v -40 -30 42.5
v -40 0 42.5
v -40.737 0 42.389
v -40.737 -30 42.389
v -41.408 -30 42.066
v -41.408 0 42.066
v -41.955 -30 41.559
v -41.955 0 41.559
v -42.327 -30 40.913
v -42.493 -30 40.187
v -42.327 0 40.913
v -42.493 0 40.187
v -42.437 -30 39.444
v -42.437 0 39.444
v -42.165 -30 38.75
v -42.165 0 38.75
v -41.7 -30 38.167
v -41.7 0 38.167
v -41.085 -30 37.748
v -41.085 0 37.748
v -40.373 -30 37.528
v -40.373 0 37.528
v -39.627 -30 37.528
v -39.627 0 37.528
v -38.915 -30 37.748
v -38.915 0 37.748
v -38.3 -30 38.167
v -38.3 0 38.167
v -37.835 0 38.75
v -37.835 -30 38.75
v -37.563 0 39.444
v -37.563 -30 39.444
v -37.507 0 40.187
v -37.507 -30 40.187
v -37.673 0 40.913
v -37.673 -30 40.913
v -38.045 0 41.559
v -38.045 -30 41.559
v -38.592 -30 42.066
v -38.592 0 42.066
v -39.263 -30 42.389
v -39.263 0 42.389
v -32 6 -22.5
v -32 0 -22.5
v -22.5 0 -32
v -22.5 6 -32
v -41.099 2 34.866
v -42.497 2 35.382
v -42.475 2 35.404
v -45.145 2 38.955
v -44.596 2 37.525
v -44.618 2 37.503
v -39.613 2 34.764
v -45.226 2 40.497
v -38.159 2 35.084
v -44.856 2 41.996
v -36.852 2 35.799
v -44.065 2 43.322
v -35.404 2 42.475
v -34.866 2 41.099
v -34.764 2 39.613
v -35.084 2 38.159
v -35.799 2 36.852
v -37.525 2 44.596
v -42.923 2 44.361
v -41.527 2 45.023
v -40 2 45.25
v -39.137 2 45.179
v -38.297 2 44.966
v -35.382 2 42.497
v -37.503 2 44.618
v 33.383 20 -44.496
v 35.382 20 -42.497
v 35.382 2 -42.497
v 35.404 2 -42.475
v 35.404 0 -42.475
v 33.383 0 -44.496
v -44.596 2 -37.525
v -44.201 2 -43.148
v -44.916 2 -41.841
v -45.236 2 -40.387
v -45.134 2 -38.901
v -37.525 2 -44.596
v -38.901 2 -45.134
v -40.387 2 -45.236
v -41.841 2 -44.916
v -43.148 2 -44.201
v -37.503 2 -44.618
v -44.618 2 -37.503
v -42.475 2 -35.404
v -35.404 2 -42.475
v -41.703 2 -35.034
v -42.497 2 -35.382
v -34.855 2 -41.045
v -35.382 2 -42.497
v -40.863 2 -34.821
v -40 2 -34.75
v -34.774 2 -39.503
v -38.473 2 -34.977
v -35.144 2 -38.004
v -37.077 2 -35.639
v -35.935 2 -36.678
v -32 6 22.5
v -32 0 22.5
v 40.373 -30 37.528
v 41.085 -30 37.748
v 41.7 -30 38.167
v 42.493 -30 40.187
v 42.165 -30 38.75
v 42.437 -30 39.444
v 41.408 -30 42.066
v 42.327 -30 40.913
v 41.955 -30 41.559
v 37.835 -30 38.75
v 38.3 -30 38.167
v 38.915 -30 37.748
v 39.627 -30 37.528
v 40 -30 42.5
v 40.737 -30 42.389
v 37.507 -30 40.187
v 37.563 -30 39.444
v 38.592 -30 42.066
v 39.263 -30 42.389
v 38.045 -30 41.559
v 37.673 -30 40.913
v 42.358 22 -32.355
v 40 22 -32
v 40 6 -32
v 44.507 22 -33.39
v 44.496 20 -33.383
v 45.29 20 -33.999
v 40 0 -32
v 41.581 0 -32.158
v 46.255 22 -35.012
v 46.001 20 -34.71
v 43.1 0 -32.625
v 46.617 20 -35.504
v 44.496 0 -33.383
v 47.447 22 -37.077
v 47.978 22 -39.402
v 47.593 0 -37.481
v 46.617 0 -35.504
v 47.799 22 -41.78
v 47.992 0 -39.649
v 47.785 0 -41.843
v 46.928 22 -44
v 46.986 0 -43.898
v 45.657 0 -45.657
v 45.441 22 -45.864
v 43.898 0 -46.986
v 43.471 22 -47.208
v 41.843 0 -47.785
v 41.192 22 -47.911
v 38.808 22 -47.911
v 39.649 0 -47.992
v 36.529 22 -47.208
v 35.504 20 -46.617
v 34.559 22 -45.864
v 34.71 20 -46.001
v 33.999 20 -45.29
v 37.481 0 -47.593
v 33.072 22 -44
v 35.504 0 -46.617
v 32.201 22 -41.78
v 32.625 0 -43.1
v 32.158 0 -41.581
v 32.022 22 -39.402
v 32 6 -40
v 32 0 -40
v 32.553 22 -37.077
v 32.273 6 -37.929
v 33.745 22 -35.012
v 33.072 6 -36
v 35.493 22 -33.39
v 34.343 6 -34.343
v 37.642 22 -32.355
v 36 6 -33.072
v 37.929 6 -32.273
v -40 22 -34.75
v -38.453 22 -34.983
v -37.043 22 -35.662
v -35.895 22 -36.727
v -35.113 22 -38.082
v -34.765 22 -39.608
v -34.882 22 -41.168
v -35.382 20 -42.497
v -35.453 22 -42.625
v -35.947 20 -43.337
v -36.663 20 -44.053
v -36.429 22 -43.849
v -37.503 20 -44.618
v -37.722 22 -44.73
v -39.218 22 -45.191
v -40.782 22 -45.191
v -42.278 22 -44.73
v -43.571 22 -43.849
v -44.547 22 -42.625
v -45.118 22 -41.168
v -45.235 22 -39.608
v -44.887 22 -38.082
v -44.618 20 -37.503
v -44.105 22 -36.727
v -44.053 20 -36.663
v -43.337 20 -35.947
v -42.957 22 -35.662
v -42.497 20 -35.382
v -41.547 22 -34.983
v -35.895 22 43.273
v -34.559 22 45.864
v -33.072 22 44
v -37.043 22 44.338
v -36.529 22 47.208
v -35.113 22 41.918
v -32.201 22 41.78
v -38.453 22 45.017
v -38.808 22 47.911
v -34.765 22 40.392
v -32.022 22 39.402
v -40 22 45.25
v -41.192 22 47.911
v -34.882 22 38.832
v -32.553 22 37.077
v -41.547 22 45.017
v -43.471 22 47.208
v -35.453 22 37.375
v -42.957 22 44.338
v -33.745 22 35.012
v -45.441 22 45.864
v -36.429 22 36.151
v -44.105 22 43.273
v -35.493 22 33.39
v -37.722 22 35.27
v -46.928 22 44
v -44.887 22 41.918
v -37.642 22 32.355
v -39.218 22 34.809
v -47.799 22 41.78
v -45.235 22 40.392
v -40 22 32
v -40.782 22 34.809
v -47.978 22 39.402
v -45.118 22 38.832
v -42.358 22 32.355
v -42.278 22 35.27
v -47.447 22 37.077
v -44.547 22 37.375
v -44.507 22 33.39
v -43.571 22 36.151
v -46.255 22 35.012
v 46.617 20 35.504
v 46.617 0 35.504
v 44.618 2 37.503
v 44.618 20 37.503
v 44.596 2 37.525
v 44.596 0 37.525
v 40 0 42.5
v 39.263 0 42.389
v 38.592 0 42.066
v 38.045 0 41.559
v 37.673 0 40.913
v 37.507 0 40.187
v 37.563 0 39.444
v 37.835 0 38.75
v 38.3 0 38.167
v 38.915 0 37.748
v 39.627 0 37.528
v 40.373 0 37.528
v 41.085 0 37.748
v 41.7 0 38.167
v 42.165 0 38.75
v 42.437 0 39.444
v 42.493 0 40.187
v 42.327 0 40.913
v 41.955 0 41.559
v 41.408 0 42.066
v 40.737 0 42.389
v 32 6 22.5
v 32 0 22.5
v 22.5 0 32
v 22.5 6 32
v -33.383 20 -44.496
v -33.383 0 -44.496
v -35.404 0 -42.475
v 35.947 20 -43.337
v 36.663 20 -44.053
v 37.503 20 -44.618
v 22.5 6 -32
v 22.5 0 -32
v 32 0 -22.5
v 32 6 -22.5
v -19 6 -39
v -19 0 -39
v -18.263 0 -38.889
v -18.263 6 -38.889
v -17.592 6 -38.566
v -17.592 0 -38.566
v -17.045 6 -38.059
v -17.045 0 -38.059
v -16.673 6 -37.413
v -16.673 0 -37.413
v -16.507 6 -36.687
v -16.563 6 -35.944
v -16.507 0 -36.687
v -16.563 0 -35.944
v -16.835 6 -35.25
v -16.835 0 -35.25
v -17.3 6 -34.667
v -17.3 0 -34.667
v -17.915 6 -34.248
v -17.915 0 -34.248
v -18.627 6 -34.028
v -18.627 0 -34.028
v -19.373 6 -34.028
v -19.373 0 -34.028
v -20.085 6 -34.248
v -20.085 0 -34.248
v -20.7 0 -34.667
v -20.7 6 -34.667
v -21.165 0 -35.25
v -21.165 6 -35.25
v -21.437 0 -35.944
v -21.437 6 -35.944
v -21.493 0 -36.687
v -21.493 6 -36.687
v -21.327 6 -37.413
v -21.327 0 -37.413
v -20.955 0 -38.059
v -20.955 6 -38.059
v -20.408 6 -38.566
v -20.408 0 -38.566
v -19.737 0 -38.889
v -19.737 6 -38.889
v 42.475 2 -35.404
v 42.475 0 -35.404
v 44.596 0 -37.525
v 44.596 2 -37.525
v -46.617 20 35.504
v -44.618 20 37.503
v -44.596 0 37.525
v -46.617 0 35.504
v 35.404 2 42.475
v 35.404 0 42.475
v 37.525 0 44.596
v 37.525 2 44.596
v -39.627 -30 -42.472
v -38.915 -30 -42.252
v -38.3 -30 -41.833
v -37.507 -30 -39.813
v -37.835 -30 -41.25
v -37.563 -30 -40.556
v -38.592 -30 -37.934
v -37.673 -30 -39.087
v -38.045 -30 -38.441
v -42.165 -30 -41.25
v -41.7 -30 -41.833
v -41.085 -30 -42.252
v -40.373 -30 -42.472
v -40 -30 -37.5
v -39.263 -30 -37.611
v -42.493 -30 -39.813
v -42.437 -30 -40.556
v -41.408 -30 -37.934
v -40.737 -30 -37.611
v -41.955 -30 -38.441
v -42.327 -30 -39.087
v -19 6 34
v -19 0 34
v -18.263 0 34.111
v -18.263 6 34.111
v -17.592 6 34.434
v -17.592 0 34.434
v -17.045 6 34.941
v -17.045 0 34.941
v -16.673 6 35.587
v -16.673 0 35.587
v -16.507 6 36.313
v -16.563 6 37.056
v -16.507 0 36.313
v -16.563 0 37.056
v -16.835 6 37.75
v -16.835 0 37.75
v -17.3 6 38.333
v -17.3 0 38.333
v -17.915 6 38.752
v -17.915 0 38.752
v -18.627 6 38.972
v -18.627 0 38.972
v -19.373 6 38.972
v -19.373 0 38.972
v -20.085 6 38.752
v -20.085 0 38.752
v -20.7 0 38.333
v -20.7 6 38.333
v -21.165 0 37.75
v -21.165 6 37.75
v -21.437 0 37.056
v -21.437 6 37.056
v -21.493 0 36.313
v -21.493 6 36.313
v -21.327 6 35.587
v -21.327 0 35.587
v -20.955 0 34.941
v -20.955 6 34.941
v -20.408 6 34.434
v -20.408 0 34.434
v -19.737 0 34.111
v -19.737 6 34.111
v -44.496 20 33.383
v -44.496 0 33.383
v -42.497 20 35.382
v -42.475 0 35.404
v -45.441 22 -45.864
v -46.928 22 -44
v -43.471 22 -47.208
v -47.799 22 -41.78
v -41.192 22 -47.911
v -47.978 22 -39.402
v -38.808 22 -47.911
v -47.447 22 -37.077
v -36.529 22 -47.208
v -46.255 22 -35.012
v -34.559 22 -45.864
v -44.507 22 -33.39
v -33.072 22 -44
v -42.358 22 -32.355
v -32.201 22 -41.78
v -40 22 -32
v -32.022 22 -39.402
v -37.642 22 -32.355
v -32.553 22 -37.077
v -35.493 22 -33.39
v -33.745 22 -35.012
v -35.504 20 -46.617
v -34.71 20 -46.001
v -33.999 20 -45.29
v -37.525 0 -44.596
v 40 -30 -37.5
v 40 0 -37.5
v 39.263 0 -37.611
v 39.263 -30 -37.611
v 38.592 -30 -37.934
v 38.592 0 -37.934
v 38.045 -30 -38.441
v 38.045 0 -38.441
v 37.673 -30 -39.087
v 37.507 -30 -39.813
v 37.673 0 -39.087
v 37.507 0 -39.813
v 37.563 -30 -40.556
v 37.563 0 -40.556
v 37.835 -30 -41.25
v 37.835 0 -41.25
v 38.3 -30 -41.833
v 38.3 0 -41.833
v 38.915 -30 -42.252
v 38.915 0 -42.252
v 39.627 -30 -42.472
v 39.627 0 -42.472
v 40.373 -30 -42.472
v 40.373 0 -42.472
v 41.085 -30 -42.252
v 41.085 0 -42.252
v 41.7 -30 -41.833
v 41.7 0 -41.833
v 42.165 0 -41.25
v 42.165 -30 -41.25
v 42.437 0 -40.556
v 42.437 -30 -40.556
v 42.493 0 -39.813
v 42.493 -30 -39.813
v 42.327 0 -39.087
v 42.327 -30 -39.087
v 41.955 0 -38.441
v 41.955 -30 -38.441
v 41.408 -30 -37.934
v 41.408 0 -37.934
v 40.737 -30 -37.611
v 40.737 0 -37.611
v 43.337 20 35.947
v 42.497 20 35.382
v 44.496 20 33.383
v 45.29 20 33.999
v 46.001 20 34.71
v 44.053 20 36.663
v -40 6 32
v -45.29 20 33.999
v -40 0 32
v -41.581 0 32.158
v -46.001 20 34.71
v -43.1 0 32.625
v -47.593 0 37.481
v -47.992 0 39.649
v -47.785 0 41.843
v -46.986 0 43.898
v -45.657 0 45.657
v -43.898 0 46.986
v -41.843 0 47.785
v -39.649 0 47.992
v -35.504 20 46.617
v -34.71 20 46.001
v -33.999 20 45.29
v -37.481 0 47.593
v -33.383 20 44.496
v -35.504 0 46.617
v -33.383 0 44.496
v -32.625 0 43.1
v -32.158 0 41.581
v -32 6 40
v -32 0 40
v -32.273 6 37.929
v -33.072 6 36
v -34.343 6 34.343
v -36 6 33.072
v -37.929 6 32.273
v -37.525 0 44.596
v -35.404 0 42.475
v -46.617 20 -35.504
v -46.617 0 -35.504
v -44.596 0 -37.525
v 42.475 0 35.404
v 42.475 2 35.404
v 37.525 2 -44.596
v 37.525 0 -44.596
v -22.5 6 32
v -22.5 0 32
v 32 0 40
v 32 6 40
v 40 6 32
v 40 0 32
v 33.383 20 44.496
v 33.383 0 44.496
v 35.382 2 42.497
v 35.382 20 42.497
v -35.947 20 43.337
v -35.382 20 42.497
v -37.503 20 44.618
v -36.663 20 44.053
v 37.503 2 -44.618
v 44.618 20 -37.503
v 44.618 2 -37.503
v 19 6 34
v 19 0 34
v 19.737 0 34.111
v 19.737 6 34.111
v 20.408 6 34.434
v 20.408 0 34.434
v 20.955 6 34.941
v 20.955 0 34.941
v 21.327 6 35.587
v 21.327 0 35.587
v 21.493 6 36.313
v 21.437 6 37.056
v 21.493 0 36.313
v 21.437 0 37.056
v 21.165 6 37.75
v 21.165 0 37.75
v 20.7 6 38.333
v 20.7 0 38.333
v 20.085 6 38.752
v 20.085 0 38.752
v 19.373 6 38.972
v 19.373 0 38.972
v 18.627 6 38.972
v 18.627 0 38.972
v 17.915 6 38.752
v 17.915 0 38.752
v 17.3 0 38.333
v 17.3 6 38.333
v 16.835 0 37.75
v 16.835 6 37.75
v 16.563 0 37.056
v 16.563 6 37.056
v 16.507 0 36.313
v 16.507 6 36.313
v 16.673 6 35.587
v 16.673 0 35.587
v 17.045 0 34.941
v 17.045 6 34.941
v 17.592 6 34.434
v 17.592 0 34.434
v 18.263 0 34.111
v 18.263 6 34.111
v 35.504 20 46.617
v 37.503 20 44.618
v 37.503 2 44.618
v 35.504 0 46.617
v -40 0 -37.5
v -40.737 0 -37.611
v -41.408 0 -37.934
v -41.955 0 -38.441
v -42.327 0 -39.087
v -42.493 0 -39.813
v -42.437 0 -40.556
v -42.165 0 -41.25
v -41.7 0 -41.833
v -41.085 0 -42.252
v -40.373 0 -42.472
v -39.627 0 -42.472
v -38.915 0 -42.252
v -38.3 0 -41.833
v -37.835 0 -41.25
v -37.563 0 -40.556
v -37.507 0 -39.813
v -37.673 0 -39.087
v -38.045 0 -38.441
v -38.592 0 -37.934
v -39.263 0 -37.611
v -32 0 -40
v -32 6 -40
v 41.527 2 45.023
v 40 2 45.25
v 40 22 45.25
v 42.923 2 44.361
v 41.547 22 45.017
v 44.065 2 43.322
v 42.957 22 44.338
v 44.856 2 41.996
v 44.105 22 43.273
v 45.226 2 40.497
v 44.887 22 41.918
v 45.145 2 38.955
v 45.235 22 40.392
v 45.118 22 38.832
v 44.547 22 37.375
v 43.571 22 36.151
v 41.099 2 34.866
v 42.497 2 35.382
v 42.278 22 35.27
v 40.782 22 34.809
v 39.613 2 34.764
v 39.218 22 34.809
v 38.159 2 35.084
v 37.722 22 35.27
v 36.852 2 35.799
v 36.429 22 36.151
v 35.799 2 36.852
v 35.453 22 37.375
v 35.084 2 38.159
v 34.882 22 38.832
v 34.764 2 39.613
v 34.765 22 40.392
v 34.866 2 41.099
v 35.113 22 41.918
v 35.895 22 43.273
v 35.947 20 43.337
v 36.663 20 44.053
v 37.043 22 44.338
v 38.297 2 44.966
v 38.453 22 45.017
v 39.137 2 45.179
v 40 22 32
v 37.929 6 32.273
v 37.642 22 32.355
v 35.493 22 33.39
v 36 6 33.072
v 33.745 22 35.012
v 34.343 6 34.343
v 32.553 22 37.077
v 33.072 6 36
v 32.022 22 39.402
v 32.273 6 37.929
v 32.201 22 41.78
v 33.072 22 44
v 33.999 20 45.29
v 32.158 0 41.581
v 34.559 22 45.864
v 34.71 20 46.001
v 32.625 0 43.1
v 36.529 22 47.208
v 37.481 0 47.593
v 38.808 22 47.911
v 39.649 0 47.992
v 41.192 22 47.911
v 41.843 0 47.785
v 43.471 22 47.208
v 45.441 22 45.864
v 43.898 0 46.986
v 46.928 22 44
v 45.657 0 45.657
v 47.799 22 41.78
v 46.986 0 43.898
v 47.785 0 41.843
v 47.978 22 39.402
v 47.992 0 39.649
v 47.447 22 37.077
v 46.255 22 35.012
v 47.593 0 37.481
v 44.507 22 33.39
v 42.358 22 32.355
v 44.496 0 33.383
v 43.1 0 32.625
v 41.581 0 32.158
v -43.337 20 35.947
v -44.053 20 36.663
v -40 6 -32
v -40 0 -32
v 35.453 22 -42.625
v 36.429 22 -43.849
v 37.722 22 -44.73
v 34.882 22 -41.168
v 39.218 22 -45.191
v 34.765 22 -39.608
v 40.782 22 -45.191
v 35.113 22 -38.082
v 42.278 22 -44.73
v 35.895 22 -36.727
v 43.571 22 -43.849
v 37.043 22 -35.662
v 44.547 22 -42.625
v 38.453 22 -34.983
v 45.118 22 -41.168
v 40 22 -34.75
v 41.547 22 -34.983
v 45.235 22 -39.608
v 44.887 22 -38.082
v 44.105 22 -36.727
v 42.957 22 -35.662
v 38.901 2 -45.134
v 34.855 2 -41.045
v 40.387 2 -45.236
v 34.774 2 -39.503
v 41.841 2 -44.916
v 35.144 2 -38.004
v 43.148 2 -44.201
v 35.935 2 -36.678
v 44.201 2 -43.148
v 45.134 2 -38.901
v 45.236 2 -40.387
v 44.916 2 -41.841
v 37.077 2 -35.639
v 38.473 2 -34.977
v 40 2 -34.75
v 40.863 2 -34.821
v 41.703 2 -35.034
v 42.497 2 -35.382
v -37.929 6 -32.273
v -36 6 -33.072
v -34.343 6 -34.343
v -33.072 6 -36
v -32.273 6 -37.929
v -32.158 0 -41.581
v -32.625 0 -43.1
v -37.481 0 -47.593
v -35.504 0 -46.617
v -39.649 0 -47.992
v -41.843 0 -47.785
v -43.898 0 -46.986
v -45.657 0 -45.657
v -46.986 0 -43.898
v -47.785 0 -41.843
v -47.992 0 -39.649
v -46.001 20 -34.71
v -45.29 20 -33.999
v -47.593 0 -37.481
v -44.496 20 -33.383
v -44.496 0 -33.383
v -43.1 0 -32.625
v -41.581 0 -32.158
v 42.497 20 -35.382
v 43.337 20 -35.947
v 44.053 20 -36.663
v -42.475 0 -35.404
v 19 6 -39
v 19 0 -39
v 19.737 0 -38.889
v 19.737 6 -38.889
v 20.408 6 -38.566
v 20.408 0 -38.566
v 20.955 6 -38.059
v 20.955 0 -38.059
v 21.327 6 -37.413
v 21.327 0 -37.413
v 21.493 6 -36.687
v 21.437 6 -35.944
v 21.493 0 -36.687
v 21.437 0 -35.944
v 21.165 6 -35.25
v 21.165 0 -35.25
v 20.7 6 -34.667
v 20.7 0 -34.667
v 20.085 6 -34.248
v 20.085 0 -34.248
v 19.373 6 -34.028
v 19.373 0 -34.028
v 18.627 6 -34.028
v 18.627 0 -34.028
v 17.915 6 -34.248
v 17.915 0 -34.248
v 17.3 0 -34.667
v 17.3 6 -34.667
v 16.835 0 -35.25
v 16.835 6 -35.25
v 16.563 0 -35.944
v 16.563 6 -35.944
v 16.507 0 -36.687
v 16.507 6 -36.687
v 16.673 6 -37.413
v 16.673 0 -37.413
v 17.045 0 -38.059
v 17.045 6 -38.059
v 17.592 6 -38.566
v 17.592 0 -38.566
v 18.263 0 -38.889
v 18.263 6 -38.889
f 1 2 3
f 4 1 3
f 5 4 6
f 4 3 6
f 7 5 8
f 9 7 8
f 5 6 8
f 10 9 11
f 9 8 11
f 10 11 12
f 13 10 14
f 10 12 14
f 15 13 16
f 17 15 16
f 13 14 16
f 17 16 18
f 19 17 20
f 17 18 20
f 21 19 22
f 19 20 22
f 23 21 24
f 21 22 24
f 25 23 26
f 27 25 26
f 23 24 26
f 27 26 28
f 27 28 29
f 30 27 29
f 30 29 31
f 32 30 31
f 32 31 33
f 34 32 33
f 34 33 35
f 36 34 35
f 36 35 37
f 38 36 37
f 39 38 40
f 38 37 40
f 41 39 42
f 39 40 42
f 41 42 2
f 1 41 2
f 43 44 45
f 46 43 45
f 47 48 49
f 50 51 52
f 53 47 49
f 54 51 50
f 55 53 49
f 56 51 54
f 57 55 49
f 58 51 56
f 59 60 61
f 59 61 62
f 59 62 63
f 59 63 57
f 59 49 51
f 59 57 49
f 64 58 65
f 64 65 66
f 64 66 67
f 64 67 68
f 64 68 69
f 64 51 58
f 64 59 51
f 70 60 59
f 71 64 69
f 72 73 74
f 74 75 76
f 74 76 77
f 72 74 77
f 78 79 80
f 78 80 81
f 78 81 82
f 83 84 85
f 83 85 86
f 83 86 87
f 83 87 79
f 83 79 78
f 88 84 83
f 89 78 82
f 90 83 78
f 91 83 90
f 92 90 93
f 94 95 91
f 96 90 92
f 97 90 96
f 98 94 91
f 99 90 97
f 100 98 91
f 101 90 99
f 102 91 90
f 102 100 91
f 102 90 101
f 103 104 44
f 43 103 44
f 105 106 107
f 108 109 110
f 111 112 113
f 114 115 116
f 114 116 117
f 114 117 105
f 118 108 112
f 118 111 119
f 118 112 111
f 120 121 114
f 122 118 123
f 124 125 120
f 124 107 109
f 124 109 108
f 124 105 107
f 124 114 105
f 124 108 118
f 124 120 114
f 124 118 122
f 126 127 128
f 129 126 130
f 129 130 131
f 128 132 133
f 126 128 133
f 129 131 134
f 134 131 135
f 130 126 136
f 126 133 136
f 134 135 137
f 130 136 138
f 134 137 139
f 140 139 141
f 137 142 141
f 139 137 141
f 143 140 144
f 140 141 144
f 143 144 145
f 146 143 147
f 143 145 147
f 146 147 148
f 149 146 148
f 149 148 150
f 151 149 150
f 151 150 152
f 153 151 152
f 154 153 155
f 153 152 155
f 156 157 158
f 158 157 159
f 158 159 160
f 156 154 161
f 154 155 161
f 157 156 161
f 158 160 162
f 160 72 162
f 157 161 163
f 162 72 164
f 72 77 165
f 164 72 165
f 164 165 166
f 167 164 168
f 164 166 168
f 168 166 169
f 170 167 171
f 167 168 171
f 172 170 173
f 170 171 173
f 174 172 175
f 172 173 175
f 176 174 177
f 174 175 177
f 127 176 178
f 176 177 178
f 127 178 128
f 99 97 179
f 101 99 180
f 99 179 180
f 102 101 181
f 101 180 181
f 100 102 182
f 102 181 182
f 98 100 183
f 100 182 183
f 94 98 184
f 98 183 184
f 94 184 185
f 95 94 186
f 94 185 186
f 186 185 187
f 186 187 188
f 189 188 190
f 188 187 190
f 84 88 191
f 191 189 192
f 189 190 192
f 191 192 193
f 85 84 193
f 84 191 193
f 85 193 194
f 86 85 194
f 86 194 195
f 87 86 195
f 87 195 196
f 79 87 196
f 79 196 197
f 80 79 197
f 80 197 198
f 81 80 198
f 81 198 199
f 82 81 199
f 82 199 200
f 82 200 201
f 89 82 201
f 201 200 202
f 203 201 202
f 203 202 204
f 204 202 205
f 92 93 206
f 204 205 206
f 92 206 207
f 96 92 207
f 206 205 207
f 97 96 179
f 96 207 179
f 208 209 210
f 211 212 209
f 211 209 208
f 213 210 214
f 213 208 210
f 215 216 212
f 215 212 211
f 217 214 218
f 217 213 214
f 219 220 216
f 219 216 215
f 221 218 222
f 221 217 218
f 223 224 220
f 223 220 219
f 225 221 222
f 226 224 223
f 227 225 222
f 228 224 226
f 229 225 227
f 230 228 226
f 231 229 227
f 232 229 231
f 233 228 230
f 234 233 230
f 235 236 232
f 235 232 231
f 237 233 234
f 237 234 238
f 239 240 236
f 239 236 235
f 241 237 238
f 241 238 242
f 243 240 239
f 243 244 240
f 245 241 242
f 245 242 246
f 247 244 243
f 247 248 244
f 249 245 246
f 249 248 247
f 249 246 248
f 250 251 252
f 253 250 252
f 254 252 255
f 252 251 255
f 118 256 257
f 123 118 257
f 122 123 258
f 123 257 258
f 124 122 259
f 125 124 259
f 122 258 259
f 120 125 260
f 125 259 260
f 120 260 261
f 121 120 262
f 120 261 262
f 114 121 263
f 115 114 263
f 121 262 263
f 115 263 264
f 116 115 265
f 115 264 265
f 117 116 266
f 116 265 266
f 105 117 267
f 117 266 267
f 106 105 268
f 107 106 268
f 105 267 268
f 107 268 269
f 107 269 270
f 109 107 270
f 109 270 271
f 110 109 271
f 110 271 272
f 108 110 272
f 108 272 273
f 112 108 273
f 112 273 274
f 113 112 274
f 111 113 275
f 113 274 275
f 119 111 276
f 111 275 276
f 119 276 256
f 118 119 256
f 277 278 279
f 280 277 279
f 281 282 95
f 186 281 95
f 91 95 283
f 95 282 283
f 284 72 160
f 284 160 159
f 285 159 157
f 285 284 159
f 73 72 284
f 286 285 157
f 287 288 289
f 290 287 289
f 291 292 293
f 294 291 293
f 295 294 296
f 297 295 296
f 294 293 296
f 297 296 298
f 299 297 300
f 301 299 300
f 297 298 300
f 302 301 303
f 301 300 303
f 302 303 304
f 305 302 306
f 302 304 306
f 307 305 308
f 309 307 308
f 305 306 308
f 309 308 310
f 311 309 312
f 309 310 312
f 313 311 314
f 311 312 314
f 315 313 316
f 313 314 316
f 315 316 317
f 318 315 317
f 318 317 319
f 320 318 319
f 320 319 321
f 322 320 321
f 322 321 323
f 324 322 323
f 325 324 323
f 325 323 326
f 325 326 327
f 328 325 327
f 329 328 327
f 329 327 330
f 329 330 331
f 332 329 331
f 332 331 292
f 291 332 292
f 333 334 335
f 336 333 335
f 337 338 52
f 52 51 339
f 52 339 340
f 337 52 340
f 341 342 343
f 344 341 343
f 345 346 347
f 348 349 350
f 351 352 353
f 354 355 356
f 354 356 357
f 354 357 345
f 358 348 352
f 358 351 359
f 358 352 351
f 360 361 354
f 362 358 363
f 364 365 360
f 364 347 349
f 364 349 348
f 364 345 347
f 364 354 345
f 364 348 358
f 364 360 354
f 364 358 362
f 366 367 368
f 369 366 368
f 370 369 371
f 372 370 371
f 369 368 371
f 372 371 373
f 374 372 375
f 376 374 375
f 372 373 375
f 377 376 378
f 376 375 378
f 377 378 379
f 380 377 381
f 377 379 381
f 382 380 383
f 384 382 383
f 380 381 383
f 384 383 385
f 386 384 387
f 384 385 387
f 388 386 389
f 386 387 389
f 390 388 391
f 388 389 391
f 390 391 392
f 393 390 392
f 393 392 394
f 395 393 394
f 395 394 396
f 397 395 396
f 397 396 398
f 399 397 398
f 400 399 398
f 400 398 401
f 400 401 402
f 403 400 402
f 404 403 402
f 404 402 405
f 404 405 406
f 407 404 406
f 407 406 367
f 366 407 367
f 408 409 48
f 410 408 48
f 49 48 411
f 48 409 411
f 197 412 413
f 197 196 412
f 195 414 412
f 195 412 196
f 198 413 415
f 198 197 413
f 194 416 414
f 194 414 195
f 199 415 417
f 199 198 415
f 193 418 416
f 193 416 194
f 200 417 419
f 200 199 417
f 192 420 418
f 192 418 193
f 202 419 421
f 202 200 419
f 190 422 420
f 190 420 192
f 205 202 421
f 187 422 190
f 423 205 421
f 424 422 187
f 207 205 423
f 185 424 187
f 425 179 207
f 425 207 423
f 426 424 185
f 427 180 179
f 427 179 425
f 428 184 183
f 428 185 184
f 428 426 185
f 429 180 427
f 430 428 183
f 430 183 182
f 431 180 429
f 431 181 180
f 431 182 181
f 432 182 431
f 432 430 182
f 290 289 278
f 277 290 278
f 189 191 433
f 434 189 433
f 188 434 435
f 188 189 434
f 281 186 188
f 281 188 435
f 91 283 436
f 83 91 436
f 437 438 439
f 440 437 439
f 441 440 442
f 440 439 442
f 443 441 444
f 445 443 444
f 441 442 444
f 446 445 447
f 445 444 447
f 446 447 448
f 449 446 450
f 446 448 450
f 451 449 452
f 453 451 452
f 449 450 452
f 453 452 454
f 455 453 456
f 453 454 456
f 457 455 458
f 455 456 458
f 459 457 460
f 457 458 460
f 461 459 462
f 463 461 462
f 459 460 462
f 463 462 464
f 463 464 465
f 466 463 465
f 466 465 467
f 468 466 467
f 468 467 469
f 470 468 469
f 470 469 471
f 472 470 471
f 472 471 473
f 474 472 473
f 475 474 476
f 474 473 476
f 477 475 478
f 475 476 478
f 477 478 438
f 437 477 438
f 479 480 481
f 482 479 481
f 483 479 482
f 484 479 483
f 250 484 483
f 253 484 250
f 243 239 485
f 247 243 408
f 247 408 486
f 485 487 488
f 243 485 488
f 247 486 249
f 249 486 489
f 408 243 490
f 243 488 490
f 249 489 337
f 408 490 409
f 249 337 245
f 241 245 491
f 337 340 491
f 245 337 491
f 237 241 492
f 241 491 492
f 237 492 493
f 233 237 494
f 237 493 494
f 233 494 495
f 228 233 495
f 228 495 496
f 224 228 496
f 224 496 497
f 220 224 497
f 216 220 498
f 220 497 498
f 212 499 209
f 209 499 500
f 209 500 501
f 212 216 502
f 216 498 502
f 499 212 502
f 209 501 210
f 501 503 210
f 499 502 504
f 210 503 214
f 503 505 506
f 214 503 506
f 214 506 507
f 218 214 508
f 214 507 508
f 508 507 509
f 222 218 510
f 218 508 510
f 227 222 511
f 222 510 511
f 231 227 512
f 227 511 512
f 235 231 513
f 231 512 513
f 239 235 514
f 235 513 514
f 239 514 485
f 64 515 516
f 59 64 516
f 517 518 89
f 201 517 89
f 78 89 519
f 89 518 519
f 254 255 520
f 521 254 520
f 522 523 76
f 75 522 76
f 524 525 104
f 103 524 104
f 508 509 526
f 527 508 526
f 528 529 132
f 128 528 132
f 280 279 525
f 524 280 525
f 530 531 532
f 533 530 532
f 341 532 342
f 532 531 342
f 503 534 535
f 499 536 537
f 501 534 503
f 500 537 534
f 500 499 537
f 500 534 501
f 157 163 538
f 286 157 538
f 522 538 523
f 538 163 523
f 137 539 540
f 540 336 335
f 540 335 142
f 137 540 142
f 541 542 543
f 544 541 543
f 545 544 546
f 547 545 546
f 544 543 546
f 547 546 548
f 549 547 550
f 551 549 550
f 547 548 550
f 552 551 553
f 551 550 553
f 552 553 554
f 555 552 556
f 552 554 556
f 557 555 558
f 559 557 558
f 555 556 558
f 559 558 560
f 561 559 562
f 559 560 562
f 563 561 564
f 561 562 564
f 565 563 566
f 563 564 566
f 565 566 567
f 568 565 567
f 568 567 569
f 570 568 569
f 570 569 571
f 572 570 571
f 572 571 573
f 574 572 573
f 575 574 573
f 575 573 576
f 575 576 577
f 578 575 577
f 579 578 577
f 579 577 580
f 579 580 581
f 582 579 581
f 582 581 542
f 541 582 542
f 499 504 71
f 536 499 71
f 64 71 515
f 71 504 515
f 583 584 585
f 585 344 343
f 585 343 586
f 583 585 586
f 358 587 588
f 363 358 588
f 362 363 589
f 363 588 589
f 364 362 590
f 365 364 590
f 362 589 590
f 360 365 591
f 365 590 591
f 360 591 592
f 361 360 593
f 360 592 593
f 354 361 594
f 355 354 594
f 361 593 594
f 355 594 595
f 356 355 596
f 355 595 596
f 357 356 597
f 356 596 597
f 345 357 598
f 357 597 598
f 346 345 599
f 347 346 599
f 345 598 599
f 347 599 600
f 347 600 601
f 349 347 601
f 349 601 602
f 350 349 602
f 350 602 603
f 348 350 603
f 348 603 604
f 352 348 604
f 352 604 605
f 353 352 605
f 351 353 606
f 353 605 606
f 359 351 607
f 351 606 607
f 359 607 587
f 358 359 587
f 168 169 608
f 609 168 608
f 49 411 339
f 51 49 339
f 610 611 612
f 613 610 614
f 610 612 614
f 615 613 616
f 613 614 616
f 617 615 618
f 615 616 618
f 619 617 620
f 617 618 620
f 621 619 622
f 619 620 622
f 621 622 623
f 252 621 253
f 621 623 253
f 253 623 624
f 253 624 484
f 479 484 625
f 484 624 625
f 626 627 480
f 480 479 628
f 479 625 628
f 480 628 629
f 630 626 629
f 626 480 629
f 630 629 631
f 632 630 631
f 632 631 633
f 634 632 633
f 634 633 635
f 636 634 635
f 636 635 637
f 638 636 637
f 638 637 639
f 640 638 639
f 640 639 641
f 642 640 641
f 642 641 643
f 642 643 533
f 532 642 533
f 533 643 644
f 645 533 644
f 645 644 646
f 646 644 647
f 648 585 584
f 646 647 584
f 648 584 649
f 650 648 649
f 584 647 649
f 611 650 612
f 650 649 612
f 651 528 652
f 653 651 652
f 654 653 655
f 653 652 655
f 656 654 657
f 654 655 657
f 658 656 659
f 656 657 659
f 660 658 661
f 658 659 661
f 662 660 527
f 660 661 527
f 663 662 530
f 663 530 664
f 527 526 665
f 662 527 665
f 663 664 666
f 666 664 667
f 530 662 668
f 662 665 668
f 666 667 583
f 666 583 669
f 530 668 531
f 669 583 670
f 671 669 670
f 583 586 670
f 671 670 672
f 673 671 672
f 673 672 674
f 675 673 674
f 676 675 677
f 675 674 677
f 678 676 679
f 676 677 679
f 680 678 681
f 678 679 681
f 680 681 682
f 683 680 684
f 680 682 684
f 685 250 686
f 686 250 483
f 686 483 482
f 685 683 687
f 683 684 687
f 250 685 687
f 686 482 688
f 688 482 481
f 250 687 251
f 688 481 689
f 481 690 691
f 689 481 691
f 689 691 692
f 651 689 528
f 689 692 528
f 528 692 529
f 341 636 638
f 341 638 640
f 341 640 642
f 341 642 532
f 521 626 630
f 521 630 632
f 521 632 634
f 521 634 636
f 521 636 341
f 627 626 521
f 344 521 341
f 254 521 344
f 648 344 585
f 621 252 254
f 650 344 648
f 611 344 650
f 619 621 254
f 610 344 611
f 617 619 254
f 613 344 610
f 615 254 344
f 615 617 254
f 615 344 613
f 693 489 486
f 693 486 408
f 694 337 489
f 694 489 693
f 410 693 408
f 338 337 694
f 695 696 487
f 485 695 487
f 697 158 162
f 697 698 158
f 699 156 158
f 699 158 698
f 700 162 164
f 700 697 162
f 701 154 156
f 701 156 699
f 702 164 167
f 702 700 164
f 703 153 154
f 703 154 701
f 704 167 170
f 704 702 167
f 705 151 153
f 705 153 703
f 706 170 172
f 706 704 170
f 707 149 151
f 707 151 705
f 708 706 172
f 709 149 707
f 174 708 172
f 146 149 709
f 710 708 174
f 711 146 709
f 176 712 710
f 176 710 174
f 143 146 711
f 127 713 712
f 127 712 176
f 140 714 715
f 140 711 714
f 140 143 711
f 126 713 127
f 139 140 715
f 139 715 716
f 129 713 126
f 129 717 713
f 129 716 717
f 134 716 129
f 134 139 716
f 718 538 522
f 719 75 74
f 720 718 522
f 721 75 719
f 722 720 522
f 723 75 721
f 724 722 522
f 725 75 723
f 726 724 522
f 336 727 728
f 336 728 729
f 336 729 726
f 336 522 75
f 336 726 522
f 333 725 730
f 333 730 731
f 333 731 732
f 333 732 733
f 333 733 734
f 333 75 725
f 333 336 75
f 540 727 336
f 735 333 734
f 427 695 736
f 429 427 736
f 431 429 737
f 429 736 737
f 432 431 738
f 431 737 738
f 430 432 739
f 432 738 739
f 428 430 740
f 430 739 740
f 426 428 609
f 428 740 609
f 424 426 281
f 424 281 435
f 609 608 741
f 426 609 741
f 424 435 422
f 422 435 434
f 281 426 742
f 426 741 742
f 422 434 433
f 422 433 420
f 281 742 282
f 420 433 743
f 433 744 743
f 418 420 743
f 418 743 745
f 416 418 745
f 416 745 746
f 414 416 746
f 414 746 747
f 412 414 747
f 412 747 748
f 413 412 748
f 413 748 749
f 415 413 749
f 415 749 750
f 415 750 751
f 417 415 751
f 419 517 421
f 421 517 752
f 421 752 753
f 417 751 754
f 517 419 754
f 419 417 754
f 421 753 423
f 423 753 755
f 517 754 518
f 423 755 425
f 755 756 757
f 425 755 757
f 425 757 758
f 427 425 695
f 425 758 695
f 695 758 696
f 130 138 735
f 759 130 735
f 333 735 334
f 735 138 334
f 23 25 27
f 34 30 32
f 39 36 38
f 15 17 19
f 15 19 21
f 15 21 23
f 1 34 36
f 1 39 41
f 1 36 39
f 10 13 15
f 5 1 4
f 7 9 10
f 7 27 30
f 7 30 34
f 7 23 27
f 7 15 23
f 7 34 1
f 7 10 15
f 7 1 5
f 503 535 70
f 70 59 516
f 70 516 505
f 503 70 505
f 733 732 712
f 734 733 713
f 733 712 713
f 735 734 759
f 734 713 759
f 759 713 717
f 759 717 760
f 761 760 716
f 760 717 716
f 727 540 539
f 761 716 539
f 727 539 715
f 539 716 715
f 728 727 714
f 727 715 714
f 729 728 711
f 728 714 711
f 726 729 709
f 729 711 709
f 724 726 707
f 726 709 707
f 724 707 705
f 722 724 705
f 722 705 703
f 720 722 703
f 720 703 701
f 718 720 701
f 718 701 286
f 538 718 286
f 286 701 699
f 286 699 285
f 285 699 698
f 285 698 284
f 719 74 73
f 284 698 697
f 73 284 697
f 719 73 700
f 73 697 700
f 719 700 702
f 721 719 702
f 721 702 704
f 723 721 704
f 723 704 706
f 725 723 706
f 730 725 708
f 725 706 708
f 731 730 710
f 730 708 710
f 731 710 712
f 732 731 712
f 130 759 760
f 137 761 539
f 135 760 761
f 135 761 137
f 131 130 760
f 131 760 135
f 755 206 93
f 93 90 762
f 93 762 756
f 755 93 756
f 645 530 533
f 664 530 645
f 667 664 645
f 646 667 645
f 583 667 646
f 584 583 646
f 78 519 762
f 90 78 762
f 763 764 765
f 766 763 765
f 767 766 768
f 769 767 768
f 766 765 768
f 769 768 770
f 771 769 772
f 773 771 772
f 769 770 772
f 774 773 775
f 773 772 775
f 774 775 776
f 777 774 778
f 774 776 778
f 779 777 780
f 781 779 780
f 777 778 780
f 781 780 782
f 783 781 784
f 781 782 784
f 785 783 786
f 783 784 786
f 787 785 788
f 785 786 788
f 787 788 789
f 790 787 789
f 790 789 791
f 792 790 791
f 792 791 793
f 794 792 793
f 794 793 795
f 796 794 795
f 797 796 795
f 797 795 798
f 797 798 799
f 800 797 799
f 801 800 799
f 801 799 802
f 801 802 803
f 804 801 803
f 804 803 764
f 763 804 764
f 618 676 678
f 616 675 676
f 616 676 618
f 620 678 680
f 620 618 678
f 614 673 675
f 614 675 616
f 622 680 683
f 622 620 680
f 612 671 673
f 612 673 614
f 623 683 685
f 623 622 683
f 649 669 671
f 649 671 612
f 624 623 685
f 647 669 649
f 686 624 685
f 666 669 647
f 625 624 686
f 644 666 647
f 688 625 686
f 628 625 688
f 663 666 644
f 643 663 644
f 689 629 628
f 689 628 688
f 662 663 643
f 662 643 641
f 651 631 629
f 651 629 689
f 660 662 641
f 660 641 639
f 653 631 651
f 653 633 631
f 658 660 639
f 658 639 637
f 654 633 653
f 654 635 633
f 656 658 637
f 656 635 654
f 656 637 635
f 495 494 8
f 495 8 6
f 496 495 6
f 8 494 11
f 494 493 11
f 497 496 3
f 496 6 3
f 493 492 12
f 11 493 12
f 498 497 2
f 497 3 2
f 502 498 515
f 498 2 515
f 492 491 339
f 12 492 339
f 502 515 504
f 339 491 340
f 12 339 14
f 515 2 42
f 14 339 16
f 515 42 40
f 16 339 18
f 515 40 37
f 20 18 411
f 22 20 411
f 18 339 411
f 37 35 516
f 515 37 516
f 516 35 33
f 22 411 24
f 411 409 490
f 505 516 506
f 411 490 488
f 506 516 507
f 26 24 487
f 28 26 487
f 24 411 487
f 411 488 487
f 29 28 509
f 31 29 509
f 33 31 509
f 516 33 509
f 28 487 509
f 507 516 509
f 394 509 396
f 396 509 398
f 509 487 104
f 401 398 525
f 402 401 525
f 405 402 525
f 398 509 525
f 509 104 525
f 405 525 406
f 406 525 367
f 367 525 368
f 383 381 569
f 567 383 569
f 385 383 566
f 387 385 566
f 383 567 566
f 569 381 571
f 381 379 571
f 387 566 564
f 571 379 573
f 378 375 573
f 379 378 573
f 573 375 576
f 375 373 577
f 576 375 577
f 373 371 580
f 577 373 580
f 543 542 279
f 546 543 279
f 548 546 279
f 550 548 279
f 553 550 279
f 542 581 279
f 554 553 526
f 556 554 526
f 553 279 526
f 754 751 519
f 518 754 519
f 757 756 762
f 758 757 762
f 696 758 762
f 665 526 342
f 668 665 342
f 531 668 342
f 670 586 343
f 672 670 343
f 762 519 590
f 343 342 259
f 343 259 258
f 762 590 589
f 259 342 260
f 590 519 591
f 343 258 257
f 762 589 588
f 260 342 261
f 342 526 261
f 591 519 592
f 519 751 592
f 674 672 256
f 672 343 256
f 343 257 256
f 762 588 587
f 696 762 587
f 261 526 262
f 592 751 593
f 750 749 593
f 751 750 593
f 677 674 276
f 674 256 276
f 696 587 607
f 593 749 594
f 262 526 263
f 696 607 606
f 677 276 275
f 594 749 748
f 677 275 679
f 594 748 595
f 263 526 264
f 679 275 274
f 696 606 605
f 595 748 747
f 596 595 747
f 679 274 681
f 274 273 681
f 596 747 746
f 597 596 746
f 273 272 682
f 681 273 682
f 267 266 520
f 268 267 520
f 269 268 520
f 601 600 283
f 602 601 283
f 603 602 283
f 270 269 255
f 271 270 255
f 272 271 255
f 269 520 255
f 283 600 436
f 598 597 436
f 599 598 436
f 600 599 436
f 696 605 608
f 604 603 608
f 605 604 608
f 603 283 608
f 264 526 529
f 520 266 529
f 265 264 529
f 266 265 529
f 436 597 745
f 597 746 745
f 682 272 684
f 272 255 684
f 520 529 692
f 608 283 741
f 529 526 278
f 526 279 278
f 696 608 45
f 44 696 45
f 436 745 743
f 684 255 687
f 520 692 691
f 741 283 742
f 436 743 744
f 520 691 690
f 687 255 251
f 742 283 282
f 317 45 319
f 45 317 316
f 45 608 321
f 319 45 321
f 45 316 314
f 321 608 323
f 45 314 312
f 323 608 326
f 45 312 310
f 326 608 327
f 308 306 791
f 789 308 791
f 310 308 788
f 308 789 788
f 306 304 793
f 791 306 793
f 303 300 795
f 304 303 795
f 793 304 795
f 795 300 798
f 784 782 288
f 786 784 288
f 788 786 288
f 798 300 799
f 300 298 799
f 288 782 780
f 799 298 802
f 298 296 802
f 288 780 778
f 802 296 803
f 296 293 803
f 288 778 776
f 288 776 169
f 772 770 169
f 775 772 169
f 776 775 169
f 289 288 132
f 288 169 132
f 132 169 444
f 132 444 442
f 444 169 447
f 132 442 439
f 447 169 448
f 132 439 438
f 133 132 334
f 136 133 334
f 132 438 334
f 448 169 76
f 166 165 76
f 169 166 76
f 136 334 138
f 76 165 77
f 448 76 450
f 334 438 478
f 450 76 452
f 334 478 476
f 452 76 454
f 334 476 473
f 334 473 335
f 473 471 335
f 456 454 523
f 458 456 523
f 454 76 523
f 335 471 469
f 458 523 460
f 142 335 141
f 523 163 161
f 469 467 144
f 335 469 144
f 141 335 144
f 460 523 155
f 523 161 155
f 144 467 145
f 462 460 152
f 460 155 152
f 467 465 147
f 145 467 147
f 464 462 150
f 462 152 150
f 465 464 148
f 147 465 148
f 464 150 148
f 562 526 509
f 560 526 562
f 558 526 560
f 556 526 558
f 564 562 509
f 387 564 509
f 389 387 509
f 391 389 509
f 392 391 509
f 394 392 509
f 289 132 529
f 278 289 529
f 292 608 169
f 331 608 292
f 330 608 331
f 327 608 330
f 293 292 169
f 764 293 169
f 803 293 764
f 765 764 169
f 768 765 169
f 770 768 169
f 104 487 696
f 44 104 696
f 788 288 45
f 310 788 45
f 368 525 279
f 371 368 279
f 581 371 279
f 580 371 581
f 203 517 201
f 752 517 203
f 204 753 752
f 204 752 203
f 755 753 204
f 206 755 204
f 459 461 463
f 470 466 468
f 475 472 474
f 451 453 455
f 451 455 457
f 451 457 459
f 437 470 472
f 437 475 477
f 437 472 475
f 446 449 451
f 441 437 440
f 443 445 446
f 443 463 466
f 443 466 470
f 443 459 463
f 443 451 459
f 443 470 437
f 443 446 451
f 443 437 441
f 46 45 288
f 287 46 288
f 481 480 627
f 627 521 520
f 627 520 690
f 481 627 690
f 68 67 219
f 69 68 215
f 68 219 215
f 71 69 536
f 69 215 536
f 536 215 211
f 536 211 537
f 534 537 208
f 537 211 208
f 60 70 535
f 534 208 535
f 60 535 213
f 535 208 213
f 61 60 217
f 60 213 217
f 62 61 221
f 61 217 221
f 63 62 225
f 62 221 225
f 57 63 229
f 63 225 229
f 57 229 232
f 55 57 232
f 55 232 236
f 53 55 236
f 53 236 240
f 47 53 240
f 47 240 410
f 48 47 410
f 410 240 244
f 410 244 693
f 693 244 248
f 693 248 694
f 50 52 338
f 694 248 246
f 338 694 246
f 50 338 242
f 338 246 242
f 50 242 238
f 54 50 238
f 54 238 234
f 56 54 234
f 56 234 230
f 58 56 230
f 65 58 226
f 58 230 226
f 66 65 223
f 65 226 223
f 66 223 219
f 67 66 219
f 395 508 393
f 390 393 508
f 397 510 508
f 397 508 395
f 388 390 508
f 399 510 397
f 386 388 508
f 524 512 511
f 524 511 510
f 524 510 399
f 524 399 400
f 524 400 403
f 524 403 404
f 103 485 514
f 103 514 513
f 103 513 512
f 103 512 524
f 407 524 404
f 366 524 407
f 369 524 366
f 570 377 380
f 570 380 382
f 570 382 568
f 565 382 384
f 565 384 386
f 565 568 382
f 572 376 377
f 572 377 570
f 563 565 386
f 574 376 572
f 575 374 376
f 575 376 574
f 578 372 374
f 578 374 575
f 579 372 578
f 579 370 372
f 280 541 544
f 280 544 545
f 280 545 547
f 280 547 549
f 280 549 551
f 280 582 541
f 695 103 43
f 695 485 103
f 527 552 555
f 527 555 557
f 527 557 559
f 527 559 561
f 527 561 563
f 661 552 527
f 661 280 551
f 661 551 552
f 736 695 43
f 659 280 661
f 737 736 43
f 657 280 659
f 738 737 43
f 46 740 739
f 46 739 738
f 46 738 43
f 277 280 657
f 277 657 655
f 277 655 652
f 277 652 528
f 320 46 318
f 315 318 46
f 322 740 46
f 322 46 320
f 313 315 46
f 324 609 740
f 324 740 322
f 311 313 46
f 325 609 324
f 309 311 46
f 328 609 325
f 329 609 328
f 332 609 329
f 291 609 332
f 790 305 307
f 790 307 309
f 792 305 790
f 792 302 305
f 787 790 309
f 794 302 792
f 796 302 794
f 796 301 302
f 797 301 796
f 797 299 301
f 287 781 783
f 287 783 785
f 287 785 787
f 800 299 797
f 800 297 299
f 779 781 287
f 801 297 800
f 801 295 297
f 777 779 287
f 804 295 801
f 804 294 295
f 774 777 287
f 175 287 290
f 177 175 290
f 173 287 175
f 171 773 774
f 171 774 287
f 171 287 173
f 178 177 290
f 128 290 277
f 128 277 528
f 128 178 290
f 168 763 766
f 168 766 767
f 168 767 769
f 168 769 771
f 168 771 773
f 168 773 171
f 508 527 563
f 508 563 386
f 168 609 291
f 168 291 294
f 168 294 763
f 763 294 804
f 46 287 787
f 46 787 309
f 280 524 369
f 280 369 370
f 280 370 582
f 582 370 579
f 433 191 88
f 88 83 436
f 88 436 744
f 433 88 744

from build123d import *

# Parameters (mm, degrees)
BOSS_EXTRUDE1_DEPTH      = 6
SKETCH2_R                = 2.5
CUT_EXTRUDE1_DEPTH       = 69.14690015
BOSS_EXTRUDE2_DEPTH      = 16
BOSS_EXTRUDE2_DEPTH_BACK = 4
SKETCH4_R                = 8
CUT_EXTRUDE2_DEPTH       = 20
SKETCH7_R                = 5.25
CUT_EXTRUDE3_DEPTH       = 20
SKETCH8_R                = 2.5
BOSS_EXTRUDE3_DEPTH      = 30


with BuildPart() as part:
    # Sketch1 → Boss-Extrude1 (new body)
    with BuildSketch(Plane(origin=(0, 0, 0), x_dir=(1, 0, 0), z_dir=(0, 1, 0))):
        with BuildLine():
            Line((-32, -40), (32, -40))
            ThreePointArc((32, -40), (45.656854249, -45.656854249), (40, -32))
            Line((40, -32), (40, 32))
            ThreePointArc((40, 32), (45.656854249, 45.656854249), (32, 40))
            Line((32, 40), (-32, 40))
            ThreePointArc((-32, 40), (-45.656854249, 45.656854249), (-40, 32))
            Line((-40, 32), (-40, -32))
            ThreePointArc((-40, -32), (-45.656854249, -45.656854249), (-32, -40))
        make_face()
        Polygon((-22.5, 32), (22.5, 32), (32, 22.5), (32, -22.5), (22.5, -32), (-22.5, -32), (-32, -22.5), (-32, 22.5), align=None, mode=Mode.SUBTRACT)
    extrude(amount=BOSS_EXTRUDE1_DEPTH)

    # Sketch2 → Cut-Extrude1 (cut, through all)
    with BuildSketch(Plane.XZ):
        with Locations(Location((-19, -36.5, 0), (0, 0, 270))):
            Circle(SKETCH2_R)
        with Locations(Location((19, -36.5, 0), (0, 0, 270))):
            Circle(SKETCH2_R)
        with Locations(Location((19, 36.5, 0), (0, 0, 270))):
            Circle(SKETCH2_R)
        with Locations(Location((-19, 36.5, 0), (0, 0, 270))):
            Circle(SKETCH2_R)
    extrude(amount=-CUT_EXTRUDE1_DEPTH, mode=Mode.SUBTRACT)

    # Sketch4 → Boss-Extrude2 (add, two sides: drawn at the far end of the back side and taken through both)
    with BuildSketch(Plane(origin=(0, 6, 0), x_dir=(1, 0, 0), z_dir=(0, 1, 0)).offset(-BOSS_EXTRUDE2_DEPTH_BACK)):
        with Locations(Location((-40, 40, 0), (0, 0, 270))):
            Circle(SKETCH4_R)
        with Locations(Location((40, 40, 0), (0, 0, 270))):
            Circle(SKETCH4_R)
        with Locations(Location((40, -40, 0), (0, 0, 90))):
            Circle(SKETCH4_R)
        with Locations(Location((-40, -40, 0), (0, 0, 90))):
            Circle(SKETCH4_R)
    extrude(amount=BOSS_EXTRUDE2_DEPTH + BOSS_EXTRUDE2_DEPTH_BACK)

    # Sketch5 → Cut-Extrude2 (cut)
    with BuildSketch(Plane.XZ):
        with BuildLine():
            Line((-35.504132479, 46.617187865), (-37.525126266, 44.596194078))
            Line((-37.525126266, 44.596194078), (-35.403805922, 42.474873734))
            Line((-35.403805922, 42.474873734), (-33.382812135, 44.495867521))
            ThreePointArc((-33.382812135, 44.495867521), (-34.343145751, 45.656854249), (-35.504132479, 46.617187865))
        make_face()
        with BuildLine():
            Line((-44.596194078, 37.525126266), (-46.617187865, 35.504132479))
            ThreePointArc((-46.617187865, 35.504132479), (-45.656854249, 34.343145751), (-44.495867521, 33.382812135))
            Line((-44.495867521, 33.382812135), (-42.474873734, 35.403805922))
            Line((-42.474873734, 35.403805922), (-44.596194078, 37.525126266))
        make_face()
        with BuildLine():
            Line((35.403805922, 42.474873734), (37.525126266, 44.596194078))
            Line((37.525126266, 44.596194078), (35.504132479, 46.617187865))
            ThreePointArc((35.504132479, 46.617187865), (34.343145751, 45.656854249), (33.382812135, 44.495867521))
            Line((33.382812135, 44.495867521), (35.403805922, 42.474873734))
        make_face()
        with BuildLine():
            ThreePointArc((44.495867521, 33.382812135), (45.656854249, 34.343145751), (46.617187865, 35.504132479))
            Line((46.617187865, 35.504132479), (44.596194078, 37.525126266))
            Line((44.596194078, 37.525126266), (42.474873734, 35.403805922))
            Line((42.474873734, 35.403805922), (44.495867521, 33.382812135))
        make_face()
        with BuildLine():
            Line((44.596194078, -37.525126266), (46.617187865, -35.504132479))
            ThreePointArc((46.617187865, -35.504132479), (45.656854249, -34.343145751), (44.495867521, -33.382812135))
            Line((44.495867521, -33.382812135), (42.474873734, -35.403805922))
            Line((42.474873734, -35.403805922), (44.596194078, -37.525126266))
        make_face()
        with BuildLine():
            Line((35.504132479, -46.617187865), (37.525126266, -44.596194078))
            Line((37.525126266, -44.596194078), (35.403805922, -42.474873734))
            Line((35.403805922, -42.474873734), (33.382812135, -44.495867521))
            ThreePointArc((33.382812135, -44.495867521), (34.343145751, -45.656854249), (35.504132479, -46.617187865))
        make_face()
        with BuildLine():
            ThreePointArc((-44.495867521, -33.382812135), (-45.656854249, -34.343145751), (-46.617187865, -35.504132479))
            Line((-46.617187865, -35.504132479), (-44.596194078, -37.525126266))
            Line((-44.596194078, -37.525126266), (-42.474873734, -35.403805922))
            Line((-42.474873734, -35.403805922), (-44.495867521, -33.382812135))
        make_face()
        with BuildLine():
            Line((-35.403805922, -42.474873734), (-37.525126266, -44.596194078))
            Line((-37.525126266, -44.596194078), (-35.504132479, -46.617187865))
            ThreePointArc((-35.504132479, -46.617187865), (-34.343145751, -45.656854249), (-33.382812135, -44.495867521))
            Line((-33.382812135, -44.495867521), (-35.403805922, -42.474873734))
        make_face()
    extrude(amount=-CUT_EXTRUDE2_DEPTH, mode=Mode.SUBTRACT)

    # Sketch7 → Cut-Extrude3 (cut)
    with BuildSketch(Plane(origin=(0, 22, 0), x_dir=(1, 0, 0), z_dir=(0, 1, 0))):
        with Locations(Location((40, 40, 0), (0, 0, 270))):
            Circle(SKETCH7_R)
        with Locations(Location((40, -40, 0), (0, 0, 270))):
            Circle(SKETCH7_R)
        with Locations(Location((-40, -40, 0), (0, 0, 270))):
            Circle(SKETCH7_R)
        with Locations(Location((-40, 40, 0), (0, 0, 270))):
            Circle(SKETCH7_R)
    extrude(amount=-CUT_EXTRUDE3_DEPTH, mode=Mode.SUBTRACT)

    # Sketch8 → Boss-Extrude3 (add)
    with BuildSketch(Plane.XZ):
        with Locations(Location((-40, 40, 0), (0, 0, 90))):
            Circle(SKETCH8_R)
        with Locations(Location((40, 40, 0), (0, 0, 90))):
            Circle(SKETCH8_R)
        with Locations(Location((40, -40, 0), (0, 0, 90))):
            Circle(SKETCH8_R)
        with Locations(Location((-40, -40, 0), (0, 0, 90))):
            Circle(SKETCH8_R)
    extrude(amount=BOSS_EXTRUDE3_DEPTH)


solid = part.part
